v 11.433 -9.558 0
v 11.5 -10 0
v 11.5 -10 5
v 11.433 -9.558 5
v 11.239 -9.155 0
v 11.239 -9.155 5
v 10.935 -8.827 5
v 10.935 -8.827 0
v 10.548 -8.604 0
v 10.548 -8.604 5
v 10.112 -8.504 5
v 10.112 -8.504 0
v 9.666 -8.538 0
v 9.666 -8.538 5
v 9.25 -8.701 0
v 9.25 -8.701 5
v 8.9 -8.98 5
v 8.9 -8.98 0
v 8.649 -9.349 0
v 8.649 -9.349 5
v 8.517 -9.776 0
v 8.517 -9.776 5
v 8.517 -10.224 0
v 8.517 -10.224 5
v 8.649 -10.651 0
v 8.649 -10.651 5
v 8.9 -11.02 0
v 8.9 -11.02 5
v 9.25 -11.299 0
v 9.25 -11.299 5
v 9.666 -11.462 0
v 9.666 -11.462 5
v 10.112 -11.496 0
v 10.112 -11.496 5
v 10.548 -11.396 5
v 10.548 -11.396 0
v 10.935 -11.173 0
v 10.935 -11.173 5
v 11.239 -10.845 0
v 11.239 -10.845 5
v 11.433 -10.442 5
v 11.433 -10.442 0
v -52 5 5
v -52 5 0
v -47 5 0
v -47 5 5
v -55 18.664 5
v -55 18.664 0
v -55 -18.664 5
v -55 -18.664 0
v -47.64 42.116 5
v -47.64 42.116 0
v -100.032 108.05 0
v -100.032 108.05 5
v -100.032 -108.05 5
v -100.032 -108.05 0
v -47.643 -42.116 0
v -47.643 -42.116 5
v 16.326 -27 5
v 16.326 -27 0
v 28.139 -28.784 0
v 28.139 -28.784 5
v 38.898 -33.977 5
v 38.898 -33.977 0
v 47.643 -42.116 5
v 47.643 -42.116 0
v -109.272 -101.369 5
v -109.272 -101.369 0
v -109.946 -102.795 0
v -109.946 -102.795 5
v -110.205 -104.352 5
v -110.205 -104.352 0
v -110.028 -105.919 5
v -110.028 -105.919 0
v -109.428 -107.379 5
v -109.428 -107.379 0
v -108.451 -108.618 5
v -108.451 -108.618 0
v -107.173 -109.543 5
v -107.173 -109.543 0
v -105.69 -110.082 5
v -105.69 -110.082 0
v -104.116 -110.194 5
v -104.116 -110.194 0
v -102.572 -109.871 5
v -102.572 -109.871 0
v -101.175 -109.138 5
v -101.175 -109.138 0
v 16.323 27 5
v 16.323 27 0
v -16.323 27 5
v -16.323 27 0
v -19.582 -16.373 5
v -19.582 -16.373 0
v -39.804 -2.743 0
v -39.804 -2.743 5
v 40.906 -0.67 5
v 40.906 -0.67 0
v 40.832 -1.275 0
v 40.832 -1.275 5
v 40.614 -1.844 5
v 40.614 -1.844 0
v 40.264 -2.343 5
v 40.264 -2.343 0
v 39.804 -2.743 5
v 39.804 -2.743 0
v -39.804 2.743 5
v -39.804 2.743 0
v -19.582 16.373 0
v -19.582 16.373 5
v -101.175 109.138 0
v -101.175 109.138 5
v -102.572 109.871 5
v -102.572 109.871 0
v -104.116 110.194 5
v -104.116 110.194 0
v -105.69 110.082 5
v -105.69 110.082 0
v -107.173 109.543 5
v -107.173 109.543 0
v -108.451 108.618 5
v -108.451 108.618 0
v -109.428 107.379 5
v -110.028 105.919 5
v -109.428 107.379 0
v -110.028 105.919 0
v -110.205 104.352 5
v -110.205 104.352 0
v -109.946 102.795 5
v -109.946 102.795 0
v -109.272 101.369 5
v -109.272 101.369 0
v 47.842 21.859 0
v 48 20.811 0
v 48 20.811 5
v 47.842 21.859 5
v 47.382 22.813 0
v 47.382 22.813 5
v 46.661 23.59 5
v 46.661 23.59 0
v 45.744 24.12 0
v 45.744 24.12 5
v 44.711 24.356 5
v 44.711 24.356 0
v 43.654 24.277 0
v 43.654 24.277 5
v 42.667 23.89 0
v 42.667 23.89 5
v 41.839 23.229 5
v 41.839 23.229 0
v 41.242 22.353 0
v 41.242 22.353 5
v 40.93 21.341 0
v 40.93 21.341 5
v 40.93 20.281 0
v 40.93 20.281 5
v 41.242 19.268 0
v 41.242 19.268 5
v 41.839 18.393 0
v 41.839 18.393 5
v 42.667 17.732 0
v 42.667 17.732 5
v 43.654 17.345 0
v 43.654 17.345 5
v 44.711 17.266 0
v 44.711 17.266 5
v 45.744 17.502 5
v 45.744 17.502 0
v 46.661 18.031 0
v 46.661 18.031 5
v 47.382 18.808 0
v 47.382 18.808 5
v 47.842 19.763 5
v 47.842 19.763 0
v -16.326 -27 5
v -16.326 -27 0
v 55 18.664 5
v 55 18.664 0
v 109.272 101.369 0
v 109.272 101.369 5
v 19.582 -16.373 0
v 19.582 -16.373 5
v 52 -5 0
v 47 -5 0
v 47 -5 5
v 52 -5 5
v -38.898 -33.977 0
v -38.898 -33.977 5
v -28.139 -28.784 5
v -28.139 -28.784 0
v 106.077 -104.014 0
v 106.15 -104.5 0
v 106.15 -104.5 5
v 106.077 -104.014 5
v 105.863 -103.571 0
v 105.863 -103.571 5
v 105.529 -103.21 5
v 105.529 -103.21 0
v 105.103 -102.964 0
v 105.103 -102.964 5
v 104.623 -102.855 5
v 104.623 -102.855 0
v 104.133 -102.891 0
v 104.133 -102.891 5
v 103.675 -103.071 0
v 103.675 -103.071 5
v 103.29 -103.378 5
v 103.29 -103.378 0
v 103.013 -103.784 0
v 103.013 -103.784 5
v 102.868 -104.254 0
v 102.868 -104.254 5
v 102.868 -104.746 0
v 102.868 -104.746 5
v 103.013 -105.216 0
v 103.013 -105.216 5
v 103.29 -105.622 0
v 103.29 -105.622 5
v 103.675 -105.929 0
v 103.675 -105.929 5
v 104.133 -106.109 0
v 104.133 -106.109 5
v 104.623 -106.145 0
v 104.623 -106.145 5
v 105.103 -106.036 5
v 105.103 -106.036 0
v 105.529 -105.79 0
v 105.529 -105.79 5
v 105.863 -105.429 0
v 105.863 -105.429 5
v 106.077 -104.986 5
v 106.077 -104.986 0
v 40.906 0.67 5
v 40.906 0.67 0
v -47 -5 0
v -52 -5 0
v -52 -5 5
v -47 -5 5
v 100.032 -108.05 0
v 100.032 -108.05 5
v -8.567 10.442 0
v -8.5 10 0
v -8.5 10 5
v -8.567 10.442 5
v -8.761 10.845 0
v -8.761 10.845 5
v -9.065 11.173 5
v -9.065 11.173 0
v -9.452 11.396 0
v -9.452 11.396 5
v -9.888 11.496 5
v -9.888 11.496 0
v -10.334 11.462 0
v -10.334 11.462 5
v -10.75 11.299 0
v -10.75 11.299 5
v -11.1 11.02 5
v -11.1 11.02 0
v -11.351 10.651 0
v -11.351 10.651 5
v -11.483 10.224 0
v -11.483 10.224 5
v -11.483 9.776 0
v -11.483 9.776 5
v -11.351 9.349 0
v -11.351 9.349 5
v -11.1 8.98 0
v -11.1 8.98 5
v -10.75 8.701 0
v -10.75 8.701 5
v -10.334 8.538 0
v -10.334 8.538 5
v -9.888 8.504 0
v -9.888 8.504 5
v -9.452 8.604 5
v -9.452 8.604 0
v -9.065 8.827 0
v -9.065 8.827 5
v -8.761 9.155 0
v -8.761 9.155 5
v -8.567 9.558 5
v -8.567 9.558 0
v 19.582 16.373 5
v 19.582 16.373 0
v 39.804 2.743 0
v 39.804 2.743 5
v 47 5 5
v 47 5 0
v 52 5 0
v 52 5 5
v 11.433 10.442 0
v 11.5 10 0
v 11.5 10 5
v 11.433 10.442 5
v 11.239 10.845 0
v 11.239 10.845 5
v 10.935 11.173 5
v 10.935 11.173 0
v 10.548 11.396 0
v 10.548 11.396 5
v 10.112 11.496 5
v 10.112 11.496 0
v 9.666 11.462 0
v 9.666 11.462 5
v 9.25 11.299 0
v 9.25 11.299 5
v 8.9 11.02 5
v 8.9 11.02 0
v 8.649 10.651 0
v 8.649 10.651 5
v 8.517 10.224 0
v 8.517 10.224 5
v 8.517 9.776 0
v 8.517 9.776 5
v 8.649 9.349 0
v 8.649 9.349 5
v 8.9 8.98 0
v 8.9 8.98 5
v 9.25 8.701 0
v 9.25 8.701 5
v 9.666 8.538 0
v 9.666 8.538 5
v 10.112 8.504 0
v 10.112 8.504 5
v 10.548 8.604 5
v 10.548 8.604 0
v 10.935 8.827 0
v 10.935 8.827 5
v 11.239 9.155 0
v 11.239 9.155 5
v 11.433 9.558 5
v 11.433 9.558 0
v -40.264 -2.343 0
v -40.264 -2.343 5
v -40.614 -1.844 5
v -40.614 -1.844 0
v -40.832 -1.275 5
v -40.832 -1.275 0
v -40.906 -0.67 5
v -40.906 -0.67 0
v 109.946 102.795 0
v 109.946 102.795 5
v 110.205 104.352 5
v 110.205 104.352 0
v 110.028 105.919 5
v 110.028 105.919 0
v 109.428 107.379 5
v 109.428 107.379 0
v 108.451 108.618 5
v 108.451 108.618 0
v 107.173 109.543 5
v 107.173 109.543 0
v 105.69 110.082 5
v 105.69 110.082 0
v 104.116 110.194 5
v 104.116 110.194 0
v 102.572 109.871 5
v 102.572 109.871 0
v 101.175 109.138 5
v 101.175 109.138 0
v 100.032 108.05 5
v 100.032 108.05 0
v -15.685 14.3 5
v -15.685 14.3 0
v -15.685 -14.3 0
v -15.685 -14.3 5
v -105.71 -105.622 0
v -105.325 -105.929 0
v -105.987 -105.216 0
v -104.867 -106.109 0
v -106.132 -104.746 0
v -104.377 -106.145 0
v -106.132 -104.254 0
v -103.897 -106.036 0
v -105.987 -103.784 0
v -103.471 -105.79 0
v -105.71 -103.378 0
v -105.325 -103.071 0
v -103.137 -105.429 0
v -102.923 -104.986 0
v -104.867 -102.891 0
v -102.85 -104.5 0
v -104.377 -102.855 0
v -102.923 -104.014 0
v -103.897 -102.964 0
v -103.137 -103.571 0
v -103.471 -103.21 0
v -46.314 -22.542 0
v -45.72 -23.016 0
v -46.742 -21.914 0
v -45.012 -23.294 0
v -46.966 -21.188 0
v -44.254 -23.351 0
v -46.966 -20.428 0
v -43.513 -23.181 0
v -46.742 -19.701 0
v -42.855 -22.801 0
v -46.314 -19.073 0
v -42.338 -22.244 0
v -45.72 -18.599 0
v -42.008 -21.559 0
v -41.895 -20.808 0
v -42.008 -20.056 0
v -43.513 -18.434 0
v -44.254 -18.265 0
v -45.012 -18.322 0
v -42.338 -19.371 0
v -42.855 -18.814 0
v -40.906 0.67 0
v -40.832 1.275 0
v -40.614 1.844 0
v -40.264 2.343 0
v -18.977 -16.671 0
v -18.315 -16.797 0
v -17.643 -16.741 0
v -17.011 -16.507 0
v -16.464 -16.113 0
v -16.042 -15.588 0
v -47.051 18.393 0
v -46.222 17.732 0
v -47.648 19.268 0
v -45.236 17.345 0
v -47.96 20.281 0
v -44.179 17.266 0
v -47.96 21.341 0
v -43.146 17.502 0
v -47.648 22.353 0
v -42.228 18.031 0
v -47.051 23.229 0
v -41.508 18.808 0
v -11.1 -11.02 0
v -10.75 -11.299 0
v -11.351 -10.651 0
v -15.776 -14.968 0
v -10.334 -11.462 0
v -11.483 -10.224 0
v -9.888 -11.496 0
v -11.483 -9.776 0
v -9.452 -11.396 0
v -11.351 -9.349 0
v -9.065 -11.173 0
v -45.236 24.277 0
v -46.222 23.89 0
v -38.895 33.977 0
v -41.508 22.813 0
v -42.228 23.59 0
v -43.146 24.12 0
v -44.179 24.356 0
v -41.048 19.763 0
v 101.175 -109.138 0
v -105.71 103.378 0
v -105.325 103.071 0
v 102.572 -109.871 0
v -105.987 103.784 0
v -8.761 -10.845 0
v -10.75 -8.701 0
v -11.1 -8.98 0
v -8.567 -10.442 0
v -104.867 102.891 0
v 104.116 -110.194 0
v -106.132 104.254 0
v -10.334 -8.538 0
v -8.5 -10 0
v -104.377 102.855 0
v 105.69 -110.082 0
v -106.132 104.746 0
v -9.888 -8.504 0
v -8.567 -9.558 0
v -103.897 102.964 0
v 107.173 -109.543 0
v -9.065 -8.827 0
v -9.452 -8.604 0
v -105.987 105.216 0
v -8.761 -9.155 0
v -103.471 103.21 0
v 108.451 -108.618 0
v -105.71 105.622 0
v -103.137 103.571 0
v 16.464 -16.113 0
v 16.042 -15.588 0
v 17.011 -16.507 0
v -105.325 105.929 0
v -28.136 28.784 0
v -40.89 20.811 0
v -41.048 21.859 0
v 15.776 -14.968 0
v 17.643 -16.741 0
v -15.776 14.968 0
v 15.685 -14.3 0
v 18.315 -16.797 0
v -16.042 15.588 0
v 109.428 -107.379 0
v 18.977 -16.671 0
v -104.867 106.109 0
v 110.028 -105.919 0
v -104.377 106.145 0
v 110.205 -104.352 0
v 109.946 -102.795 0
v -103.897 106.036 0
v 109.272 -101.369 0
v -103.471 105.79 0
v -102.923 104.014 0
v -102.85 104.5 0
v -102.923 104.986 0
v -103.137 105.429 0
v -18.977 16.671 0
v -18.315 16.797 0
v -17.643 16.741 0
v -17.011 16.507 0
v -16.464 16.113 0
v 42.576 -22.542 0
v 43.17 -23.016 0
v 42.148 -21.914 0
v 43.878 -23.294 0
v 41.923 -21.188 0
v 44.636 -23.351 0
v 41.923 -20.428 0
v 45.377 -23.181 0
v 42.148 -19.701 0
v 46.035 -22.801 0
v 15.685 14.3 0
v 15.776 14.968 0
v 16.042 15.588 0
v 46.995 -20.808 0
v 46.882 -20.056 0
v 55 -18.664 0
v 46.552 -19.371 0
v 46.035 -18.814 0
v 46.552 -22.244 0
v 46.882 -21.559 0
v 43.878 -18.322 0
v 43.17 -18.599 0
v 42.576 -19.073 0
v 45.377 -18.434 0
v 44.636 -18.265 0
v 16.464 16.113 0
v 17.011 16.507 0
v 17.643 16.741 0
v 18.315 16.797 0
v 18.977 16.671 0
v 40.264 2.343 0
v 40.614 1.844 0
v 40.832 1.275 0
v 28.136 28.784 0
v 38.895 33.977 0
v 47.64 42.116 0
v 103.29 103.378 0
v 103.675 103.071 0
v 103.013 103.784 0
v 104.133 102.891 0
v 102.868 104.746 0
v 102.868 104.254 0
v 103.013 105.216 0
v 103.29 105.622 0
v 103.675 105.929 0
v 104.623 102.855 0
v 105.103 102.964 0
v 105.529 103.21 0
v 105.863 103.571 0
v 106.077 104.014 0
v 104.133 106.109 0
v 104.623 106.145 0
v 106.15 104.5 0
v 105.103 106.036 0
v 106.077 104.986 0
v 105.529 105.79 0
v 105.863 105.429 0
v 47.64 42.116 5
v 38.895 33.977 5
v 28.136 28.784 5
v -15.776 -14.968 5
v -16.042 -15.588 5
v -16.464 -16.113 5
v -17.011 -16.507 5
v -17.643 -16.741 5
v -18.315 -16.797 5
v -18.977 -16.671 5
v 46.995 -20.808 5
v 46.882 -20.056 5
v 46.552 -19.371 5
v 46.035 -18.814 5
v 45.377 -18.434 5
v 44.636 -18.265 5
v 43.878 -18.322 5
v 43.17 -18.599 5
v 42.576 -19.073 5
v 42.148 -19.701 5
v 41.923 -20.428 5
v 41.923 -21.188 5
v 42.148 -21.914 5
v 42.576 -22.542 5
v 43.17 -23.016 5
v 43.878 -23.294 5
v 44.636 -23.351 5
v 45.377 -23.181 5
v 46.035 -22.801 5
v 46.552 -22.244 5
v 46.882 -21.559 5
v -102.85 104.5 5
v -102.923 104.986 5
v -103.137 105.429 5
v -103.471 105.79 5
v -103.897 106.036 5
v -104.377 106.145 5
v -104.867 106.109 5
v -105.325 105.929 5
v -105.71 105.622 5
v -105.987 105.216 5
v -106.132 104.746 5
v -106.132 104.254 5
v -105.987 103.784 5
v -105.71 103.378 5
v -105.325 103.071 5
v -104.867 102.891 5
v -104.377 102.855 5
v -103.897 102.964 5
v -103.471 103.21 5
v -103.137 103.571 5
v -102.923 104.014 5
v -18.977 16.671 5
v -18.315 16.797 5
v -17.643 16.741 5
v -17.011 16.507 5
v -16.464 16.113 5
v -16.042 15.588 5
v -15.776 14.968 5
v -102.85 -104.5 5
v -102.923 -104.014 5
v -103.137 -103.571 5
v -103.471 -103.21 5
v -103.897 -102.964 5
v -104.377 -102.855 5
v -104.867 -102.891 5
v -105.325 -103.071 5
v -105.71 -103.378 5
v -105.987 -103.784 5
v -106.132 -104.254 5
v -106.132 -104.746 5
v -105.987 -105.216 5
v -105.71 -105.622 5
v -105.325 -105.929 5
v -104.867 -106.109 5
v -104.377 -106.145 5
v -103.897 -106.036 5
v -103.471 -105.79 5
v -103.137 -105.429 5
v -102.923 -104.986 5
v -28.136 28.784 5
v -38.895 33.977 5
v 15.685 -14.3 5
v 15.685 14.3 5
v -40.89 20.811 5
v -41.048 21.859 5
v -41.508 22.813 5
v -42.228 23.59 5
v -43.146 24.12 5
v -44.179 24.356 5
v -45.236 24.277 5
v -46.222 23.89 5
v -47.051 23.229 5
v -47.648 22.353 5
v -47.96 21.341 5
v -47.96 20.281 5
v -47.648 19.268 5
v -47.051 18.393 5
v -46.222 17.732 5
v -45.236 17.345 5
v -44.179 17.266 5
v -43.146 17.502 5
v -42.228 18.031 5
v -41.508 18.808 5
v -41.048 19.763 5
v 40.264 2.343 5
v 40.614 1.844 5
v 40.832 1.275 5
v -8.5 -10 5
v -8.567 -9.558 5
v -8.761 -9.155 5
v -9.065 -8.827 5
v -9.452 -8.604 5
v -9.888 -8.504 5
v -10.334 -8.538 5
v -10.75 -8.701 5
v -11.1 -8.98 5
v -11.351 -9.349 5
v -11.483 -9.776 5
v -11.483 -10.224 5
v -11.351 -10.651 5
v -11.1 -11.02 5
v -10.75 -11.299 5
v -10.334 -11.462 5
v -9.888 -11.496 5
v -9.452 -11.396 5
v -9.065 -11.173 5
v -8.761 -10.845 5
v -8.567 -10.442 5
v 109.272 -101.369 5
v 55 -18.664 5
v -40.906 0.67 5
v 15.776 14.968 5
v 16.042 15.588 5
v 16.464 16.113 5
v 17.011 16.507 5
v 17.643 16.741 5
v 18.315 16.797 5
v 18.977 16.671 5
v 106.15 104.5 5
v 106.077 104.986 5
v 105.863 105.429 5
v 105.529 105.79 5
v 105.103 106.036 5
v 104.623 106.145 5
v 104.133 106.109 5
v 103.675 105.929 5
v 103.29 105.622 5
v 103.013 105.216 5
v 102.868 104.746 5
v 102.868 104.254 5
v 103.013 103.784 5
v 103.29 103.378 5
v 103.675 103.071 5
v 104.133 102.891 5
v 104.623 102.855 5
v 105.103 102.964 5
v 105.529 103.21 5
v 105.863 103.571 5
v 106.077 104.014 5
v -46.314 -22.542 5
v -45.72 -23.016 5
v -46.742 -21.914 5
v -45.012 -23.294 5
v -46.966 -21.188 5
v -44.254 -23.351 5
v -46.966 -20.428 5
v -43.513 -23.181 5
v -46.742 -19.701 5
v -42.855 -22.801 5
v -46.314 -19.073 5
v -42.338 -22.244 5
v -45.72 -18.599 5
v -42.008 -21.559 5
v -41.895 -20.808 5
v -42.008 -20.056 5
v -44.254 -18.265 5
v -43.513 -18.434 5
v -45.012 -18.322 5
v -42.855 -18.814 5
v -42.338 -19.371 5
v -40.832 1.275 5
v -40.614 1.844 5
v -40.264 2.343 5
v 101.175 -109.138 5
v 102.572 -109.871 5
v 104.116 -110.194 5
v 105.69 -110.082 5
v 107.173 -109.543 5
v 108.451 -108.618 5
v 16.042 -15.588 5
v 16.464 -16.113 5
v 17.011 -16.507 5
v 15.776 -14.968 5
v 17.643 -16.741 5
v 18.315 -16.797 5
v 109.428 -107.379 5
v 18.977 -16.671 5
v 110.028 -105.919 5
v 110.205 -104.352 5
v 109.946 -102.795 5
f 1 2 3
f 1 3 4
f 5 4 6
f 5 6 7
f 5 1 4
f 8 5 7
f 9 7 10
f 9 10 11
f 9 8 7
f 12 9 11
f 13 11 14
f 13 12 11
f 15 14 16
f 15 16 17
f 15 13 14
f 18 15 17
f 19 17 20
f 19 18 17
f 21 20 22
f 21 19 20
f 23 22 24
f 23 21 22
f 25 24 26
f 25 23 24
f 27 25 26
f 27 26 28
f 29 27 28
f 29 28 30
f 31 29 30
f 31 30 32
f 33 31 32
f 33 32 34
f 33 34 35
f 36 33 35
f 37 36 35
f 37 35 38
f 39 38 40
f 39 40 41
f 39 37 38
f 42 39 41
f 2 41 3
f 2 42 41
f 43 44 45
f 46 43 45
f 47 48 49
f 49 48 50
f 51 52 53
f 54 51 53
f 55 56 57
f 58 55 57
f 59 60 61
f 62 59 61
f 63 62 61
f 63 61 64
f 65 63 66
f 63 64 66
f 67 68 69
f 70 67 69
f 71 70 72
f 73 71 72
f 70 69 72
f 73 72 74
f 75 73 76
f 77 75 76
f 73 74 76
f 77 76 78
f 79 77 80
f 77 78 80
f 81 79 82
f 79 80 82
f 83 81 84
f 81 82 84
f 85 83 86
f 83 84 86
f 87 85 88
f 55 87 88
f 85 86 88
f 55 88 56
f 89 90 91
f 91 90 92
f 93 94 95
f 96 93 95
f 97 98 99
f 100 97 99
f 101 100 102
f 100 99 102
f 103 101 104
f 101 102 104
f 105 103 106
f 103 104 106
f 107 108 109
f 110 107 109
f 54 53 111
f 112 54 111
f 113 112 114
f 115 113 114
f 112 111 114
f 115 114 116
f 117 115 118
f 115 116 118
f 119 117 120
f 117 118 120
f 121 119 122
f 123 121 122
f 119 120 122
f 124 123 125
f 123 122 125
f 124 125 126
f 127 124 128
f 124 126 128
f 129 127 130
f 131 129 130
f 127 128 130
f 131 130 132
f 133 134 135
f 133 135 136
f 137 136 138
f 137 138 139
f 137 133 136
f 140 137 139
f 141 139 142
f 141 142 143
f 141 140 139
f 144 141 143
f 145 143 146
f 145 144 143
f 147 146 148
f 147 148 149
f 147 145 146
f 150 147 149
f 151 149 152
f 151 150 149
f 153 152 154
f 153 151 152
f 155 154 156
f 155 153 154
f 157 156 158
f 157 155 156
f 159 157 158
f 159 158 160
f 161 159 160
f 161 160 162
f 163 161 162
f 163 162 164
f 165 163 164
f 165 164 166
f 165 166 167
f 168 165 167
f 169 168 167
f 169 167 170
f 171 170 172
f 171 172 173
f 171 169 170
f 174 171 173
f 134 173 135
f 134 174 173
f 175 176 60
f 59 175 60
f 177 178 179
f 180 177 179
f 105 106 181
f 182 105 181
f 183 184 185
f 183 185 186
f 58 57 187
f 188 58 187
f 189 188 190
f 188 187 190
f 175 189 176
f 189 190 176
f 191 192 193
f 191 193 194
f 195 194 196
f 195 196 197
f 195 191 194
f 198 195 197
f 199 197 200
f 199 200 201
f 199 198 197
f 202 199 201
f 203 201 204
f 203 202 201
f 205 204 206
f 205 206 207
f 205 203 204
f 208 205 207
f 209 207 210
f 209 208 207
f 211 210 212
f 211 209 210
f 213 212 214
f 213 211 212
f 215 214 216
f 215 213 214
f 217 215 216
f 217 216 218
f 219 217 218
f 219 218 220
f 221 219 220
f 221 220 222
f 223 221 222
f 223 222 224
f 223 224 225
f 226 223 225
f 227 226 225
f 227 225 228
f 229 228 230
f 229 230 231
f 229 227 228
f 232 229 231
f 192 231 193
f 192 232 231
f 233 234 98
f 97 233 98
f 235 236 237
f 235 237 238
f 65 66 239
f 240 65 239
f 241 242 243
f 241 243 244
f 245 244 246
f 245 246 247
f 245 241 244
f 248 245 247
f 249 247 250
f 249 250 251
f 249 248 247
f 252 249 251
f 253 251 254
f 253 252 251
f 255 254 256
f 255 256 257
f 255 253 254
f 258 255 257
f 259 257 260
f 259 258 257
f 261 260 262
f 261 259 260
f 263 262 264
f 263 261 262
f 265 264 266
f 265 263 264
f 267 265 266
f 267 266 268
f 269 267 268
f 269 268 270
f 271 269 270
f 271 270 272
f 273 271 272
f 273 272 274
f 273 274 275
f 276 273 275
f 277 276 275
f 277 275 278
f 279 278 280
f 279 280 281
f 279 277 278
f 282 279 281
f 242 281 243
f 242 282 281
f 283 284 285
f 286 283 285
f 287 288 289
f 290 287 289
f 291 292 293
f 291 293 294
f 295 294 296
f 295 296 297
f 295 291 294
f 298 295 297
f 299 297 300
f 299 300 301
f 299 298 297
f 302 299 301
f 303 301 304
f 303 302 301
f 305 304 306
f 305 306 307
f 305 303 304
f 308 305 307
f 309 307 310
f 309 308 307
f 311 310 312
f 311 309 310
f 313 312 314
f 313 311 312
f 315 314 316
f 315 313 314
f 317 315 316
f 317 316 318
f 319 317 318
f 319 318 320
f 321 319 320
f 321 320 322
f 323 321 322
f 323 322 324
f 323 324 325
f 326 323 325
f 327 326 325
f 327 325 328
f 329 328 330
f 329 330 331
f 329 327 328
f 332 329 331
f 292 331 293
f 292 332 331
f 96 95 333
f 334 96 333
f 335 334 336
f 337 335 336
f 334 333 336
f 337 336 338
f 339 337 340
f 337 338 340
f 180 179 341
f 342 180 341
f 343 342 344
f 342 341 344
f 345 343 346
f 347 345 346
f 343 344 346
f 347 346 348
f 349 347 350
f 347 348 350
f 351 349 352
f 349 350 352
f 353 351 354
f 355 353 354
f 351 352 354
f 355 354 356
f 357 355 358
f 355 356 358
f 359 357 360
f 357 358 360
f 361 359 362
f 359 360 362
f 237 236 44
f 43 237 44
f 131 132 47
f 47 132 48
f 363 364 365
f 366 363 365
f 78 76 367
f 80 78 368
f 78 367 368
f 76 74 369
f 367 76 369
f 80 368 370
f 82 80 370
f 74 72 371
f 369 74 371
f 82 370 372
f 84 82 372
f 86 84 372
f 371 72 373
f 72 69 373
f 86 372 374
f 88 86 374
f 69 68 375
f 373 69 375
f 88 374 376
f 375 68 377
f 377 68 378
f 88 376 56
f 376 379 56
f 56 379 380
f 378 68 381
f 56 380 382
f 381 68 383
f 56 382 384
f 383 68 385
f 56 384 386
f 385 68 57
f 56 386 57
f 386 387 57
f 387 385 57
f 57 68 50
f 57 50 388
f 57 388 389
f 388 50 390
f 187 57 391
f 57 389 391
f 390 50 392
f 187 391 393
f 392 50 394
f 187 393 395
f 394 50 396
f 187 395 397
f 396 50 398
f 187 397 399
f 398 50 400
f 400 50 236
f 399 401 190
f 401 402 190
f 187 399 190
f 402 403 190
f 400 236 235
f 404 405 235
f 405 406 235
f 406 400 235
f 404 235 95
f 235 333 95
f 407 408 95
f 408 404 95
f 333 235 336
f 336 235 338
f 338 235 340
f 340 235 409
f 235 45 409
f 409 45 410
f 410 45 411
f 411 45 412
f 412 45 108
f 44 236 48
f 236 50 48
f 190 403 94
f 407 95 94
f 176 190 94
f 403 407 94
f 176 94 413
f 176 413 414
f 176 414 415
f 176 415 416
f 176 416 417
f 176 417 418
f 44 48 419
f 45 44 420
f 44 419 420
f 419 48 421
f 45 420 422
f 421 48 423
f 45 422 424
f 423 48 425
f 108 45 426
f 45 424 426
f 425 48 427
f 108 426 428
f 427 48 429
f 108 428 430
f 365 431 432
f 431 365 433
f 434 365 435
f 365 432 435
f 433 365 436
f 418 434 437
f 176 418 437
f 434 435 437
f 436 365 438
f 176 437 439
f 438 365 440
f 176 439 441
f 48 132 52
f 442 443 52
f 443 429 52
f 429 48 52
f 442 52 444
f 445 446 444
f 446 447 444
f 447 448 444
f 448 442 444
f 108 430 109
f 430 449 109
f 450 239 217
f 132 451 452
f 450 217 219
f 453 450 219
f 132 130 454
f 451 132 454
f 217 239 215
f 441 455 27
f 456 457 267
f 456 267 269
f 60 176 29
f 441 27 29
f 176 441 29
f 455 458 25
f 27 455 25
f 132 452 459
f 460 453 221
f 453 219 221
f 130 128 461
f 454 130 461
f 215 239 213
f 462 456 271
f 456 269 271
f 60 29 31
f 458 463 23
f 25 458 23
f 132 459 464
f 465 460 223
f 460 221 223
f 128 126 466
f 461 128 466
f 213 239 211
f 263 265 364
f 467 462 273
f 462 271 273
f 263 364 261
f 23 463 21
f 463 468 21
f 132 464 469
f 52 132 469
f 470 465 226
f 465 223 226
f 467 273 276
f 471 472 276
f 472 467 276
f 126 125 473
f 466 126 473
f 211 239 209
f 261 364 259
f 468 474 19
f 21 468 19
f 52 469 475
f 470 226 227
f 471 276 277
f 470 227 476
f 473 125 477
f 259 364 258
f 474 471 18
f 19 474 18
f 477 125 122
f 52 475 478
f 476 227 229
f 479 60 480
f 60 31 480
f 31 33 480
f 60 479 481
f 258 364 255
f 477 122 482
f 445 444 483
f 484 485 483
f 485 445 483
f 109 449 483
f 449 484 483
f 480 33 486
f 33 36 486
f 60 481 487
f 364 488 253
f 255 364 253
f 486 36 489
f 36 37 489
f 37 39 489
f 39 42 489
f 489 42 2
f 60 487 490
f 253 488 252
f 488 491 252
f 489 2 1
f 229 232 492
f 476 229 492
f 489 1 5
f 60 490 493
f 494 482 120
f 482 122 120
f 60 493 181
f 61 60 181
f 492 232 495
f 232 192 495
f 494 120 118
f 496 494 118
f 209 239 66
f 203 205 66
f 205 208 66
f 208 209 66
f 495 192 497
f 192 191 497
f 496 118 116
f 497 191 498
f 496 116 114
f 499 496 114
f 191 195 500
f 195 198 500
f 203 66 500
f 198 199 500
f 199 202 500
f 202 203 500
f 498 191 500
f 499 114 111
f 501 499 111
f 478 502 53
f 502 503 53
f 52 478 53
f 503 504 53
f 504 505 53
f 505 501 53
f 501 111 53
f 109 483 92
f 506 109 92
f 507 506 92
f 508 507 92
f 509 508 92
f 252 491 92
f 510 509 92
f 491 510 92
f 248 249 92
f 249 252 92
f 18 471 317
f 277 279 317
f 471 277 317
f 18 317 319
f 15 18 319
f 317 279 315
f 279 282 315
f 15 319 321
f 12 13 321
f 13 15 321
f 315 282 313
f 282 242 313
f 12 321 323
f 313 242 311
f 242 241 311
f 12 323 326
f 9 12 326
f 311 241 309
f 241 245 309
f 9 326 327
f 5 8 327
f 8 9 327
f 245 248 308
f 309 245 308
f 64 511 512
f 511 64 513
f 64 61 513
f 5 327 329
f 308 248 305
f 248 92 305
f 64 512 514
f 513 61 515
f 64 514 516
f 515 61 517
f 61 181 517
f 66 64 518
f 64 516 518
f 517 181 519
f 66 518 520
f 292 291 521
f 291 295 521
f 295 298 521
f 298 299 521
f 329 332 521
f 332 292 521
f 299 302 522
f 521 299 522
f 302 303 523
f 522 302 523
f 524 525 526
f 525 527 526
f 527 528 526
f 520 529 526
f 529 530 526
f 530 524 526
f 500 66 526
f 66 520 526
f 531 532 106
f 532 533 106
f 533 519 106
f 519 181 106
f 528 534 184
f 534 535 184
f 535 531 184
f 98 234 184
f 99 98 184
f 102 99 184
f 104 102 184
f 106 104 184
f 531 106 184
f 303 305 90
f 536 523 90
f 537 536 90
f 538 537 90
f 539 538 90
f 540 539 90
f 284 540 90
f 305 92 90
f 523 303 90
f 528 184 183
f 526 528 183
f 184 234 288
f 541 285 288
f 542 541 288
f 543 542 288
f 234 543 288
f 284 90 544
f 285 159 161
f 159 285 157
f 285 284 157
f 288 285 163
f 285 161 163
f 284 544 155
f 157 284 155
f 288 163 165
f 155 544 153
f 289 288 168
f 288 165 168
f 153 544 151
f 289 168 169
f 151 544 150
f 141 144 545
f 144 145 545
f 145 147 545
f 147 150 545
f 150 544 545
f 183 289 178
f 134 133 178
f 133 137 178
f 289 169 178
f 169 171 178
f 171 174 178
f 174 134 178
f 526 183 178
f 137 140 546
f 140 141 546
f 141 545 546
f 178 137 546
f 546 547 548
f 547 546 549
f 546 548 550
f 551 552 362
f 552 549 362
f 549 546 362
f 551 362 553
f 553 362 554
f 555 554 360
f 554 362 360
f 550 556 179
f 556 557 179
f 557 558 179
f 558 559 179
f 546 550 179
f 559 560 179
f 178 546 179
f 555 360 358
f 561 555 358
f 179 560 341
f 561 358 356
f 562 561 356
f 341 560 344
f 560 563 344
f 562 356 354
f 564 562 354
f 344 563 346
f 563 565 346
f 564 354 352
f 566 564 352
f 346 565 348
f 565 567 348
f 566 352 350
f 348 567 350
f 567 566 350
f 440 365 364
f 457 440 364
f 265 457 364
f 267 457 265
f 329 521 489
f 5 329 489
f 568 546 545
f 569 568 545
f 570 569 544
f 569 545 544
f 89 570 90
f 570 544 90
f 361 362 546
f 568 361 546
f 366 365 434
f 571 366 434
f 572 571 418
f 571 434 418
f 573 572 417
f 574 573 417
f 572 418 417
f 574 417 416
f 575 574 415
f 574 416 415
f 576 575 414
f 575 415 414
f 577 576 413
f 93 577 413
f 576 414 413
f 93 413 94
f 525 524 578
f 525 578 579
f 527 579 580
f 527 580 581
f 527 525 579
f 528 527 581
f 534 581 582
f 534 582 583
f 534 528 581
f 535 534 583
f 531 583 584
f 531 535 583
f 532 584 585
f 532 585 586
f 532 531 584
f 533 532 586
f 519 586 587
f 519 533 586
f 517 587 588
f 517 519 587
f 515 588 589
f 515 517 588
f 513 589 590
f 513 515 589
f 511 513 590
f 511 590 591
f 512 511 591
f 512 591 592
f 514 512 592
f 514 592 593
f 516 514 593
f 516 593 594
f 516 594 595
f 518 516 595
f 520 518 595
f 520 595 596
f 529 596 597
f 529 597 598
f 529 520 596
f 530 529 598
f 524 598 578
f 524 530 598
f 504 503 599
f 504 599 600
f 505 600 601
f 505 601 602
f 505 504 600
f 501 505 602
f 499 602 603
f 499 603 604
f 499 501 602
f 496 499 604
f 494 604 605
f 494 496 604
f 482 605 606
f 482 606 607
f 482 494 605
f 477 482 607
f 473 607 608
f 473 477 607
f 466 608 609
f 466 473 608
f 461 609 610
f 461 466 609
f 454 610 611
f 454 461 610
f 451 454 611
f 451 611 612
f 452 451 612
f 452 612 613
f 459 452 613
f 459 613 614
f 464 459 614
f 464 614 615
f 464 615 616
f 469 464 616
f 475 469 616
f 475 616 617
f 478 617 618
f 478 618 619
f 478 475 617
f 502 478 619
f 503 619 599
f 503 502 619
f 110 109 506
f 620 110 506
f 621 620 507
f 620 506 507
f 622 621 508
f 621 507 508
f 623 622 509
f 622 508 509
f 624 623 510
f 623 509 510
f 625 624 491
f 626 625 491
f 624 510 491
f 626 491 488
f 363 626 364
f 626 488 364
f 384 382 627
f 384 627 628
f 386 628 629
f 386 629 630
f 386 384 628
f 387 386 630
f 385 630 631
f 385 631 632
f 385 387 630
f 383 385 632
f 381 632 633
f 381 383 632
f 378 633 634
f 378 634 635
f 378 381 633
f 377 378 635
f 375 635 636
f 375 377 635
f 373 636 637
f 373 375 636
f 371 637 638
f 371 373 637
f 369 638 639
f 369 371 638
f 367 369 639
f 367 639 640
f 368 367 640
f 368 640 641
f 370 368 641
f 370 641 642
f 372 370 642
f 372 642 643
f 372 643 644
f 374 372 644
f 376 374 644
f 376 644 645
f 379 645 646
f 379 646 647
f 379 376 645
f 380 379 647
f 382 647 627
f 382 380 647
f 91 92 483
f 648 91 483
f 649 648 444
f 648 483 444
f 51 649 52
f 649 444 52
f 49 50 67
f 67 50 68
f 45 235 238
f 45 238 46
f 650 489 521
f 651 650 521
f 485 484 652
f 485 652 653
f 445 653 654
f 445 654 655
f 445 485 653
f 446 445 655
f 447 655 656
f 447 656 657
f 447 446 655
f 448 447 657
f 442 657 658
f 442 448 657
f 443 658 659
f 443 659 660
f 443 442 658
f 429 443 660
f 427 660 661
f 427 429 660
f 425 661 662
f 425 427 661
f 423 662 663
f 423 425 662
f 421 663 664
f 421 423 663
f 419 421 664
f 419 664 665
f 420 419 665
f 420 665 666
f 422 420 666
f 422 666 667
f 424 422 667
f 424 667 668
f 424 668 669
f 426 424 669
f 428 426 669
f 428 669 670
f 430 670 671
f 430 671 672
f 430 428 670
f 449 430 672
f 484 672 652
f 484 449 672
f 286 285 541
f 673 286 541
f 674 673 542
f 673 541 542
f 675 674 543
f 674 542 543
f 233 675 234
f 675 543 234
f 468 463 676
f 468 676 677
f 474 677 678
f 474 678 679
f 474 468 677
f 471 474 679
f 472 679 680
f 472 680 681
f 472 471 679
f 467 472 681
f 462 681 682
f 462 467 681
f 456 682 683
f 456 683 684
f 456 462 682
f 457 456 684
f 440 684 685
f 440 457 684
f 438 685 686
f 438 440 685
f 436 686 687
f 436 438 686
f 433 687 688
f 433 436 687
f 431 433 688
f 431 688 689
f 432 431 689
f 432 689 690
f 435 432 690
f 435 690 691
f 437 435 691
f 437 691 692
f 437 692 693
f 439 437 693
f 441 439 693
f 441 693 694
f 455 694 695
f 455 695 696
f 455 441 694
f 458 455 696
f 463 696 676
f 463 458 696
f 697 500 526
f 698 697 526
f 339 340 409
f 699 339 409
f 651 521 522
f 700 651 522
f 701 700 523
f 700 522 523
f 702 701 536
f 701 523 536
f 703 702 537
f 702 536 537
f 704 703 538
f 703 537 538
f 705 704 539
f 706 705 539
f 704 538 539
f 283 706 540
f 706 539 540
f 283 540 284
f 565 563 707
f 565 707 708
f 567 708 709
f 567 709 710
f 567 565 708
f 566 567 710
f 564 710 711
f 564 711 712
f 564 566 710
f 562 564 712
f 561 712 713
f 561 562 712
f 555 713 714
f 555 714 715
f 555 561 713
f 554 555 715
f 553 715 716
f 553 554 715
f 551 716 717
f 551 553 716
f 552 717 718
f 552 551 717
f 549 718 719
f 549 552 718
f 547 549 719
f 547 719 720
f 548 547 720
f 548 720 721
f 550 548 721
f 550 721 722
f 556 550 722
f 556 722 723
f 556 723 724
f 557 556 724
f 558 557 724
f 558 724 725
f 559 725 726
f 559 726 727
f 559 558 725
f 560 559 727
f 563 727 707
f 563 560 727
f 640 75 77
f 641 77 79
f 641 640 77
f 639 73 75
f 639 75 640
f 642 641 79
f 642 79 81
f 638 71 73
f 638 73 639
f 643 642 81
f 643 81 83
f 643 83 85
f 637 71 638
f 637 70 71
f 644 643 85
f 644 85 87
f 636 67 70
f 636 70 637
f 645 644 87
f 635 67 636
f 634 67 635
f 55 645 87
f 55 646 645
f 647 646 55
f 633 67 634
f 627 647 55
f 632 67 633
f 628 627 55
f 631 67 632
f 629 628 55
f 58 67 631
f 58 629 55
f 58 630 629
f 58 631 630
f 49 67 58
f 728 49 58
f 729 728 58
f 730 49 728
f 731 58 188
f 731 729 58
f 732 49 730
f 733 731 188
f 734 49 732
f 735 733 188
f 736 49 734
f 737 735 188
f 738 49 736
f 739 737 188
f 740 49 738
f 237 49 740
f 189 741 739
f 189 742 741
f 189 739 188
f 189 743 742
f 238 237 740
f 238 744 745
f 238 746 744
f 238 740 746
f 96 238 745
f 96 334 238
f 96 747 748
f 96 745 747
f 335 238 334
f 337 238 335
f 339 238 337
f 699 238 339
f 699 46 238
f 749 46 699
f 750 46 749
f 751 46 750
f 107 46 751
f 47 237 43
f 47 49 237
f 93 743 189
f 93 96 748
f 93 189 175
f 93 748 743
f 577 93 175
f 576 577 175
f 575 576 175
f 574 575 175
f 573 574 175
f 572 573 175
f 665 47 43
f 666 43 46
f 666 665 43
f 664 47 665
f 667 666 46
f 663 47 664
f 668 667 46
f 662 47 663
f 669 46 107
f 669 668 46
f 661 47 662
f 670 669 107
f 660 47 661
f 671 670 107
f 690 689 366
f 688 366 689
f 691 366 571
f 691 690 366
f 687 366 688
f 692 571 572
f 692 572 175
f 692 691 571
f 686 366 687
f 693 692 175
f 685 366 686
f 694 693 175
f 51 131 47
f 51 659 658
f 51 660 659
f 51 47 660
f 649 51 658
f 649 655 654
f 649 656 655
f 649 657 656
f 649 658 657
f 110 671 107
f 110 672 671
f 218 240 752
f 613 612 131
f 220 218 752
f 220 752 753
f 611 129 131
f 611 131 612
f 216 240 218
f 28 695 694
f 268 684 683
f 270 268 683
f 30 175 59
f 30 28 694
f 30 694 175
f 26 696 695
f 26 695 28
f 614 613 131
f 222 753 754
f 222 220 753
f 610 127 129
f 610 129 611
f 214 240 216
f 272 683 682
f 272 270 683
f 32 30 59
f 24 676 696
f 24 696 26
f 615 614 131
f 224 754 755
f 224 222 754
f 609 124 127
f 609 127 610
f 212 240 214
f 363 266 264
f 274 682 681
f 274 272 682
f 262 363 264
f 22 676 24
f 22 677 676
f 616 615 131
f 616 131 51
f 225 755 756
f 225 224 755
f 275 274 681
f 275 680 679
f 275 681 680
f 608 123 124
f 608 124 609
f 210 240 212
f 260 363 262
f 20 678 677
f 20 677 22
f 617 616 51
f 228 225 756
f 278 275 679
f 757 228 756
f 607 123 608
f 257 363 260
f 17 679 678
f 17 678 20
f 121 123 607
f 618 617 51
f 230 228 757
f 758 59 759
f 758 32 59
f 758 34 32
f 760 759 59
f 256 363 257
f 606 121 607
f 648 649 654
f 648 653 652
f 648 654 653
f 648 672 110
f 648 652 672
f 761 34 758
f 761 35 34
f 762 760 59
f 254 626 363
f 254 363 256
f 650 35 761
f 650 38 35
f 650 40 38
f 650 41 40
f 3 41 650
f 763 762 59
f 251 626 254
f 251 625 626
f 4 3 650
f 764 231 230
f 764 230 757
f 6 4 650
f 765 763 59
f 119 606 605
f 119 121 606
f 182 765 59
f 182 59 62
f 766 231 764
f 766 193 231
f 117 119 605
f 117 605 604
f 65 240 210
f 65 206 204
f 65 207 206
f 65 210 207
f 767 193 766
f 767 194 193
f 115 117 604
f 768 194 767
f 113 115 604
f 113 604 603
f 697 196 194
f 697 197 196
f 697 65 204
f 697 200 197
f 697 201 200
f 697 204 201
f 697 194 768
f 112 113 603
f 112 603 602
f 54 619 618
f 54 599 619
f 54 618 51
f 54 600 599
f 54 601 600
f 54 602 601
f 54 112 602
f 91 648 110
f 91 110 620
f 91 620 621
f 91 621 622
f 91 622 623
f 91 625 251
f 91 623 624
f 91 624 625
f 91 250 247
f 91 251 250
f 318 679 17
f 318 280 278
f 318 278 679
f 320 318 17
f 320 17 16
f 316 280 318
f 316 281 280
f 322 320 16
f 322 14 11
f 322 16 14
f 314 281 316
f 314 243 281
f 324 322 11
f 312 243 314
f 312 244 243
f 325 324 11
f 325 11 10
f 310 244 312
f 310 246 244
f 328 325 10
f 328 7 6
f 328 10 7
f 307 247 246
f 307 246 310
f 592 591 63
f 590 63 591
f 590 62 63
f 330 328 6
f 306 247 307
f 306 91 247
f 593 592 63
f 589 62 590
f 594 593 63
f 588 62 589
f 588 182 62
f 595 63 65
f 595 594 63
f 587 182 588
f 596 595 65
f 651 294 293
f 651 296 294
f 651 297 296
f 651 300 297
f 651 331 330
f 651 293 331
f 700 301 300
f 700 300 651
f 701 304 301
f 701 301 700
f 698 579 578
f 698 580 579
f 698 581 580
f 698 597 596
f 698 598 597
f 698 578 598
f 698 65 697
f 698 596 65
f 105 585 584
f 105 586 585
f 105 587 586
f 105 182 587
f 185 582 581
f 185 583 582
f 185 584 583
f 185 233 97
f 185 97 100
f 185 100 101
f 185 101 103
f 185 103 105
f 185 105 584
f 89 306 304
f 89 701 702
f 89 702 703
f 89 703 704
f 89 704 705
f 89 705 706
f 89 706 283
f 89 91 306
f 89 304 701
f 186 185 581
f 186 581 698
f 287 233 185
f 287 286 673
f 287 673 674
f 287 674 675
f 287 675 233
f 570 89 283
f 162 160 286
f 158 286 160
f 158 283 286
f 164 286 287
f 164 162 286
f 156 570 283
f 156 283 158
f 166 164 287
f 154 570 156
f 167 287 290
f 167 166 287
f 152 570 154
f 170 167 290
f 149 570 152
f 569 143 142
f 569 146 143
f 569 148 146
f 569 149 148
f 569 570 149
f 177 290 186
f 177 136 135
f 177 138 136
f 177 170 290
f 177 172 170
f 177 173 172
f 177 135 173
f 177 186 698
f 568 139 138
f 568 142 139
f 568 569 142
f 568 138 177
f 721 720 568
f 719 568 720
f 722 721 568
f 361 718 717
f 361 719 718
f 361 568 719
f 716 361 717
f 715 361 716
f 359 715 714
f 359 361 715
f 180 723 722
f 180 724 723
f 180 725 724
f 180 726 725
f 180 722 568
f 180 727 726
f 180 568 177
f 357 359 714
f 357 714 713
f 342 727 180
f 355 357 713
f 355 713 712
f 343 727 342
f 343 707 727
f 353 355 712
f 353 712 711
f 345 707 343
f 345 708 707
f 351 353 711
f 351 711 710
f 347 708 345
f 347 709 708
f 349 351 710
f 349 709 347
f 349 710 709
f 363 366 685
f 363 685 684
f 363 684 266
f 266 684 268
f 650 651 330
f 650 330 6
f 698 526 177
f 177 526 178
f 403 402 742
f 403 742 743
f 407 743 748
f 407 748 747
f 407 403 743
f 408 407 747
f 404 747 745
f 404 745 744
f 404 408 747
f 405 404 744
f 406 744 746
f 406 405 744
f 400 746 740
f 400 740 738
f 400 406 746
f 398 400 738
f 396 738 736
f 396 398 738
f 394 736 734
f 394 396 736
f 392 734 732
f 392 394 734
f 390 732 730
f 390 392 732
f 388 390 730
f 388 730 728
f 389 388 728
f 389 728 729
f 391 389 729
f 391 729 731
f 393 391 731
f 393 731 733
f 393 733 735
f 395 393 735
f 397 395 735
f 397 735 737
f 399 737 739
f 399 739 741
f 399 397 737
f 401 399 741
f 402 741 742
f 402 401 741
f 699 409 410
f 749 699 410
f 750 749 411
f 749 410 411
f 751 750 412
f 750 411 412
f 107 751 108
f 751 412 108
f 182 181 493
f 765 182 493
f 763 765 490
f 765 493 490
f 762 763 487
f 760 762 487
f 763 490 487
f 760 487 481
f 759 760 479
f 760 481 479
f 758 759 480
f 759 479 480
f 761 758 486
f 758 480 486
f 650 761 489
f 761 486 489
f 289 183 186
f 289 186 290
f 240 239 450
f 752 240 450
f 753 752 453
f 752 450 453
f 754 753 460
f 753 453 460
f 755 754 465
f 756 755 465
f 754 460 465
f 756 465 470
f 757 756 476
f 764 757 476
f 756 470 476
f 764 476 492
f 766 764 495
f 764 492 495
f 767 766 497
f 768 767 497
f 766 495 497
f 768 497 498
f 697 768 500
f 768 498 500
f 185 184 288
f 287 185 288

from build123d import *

# Parameters (mm, degrees)
F0_R     = 1.65
F0_R_2   = 2.55
F0_W     = 5
F0_H     = 10
F0_R_3   = 1.5
F0_R_4   = 3.555
F1_DEPTH = 5


# Not quite as in the source:
# - ends of sketch curves that miss each other by under 0.0002 mm in the source are joined


with BuildPart() as f1:
    # F0 (on Top) → F1 (new body)
    with BuildSketch(Plane.XY):
        with BuildLine():
            Line((-47.640397, 42.115595), (-100.031737, 108.050449))
            ThreePointArc((-100.031737, 108.050449), (-107.8442155419, 109.1246397394), (-109.2715048598, 101.368896092))
            Line((-109.2715048598, 101.368896092), (-54.999977, 18.664241))
            Line((-54.999977, 18.664241), (-54.999977, -18.664242))
            Line((-54.999977, -18.664242), (-109.271505, -101.368897))
            ThreePointArc((-109.271505, -101.368897), (-107.8441644553, -109.1246766812), (-100.031658534, -108.0503513703))
            Line((-100.031658534, -108.0503513703), (-47.643302, -42.116283))
            ThreePointArc((-47.643302, -42.116283), (-33.7130803066, -30.9767526972), (-16.325566, -27))
            Line((-16.325566, -27), (16.325565, -27))
            ThreePointArc((16.325565, -27), (33.7130793066, -30.9767526972), (47.6433013924, -42.1162826882))
            Line((47.6433013924, -42.1162826882), (100.031658, -108.050351))
            ThreePointArc((100.031658, -108.050351), (107.8441644255, -109.1246767027), (109.2715050175, -101.3688963323))
            Line((109.2715050175, -101.3688963323), (54.999976, -18.664242))
            Line((54.999976, -18.664242), (54.999976, 18.664241))
            Line((54.999976, 18.664241), (109.271504, 101.368896))
            ThreePointArc((109.271504, 101.368896), (107.8442155121, 109.1246397609), (100.0317360662, 108.0504489474))
            Line((100.0317360662, 108.0504489474), (47.640396, 42.115595))
            ThreePointArc((47.640396, 42.115595), (33.7103248028, 30.9765618002), (16.323206, 27))
            Line((16.323206, 27), (-16.323206, 27))
            ThreePointArc((-16.323206, 27), (-33.710325083, 30.9765619354), (-47.640397, 42.115595))
        make_face()
        with Locations((-104.5, -104.5)):
            Circle(F0_R, mode=Mode.SUBTRACT)
        with Locations((-44.444977, -20.807752)):
            Circle(F0_R_2, mode=Mode.SUBTRACT)
        with Locations((-49.499977, 0)):
            Rectangle(F0_W, F0_H, mode=Mode.SUBTRACT)
        with BuildLine():
            Line((-19.581953, -16.373154), (-39.803759, -2.743263))
            ThreePointArc((-39.803759, -2.743263), (-40.6136447533, -1.8442487652), (-40.906473, -0.670199))
            Line((-40.906473, -0.670199), (-40.906473, 0.670176))
            ThreePointArc((-40.906473, 0.670176), (-40.6136450793, 1.8442251525), (-39.8037598701, 2.7432388072))
            Line((-39.8037598701, 2.7432388072), (-19.581955, 16.373149))
            ThreePointArc((-19.581955, 16.373149), (-17.0106188475, 16.5072580793), (-15.684668, 14.300086))
            Line((-15.684668, 14.300086), (-15.684668, -14.30009))
            ThreePointArc((-15.684668, -14.30009), (-17.0106178687, -16.5072615586), (-19.581953, -16.373154))
        make_face(mode=Mode.SUBTRACT)
        with Locations((-10, -10)):
            Circle(F0_R_3, mode=Mode.SUBTRACT)
        with Locations((104.5, -104.5)):
            Circle(F0_R, mode=Mode.SUBTRACT)
        with Locations((10, -10)):
            Circle(F0_R_3, mode=Mode.SUBTRACT)
        with Locations((44.444976, -20.807752)):
            Circle(F0_R_2, mode=Mode.SUBTRACT)
        with BuildLine():
            Line((19.581954, 16.373149), (39.803759, 2.743239))
            ThreePointArc((39.803759, 2.743239), (40.6136440793, 1.8442251525), (40.906472, 0.670176))
            Line((40.906472, 0.670176), (40.906472, -0.670199))
            ThreePointArc((40.906472, -0.670199), (40.6136437533, -1.8442487652), (39.803757719, -2.7432625831))
            Line((39.803757719, -2.7432625831), (19.581952, -16.373154))
            ThreePointArc((19.581952, -16.373154), (17.0106168687, -16.5072615586), (15.684667, -14.30009))
            Line((15.684667, -14.30009), (15.684667, 14.300086))
            ThreePointArc((15.684667, 14.300086), (17.0106178475, 16.5072580793), (19.581954, 16.373149))
        make_face(mode=Mode.SUBTRACT)
        with Locations((49.499976, 0)):
            Rectangle(F0_W, F0_H, mode=Mode.SUBTRACT)
        with Locations((-44.444977, 20.810818)):
            Circle(F0_R_4, mode=Mode.SUBTRACT)
        with Locations((-10, 10)):
            Circle(F0_R_3, mode=Mode.SUBTRACT)
        with Locations((-104.5, 104.5)):
            Circle(F0_R, mode=Mode.SUBTRACT)
        with Locations((10, 10)):
            Circle(F0_R_3, mode=Mode.SUBTRACT)
        with Locations((44.444976, 20.810818)):
            Circle(F0_R_4, mode=Mode.SUBTRACT)
        with Locations((104.5, 104.5)):
            Circle(F0_R, mode=Mode.SUBTRACT)
    extrude(amount=F1_DEPTH)


solid = f1.part
